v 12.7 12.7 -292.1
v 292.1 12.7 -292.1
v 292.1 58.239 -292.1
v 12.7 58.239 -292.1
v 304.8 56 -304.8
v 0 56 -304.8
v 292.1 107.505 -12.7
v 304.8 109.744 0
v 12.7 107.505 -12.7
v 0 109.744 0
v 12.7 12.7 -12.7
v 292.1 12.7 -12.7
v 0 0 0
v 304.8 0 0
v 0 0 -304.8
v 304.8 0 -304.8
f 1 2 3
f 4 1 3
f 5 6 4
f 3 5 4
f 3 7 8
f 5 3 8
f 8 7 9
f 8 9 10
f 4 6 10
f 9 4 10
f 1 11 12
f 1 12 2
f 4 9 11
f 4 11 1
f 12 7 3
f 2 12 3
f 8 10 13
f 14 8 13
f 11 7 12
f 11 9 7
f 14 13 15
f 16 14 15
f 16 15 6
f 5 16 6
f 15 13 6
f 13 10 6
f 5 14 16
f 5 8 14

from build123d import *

# Parameters (mm, degrees)
BOSS_EXTRUDE1_DEPTH = 304.8
SHELL1_T            = -12.7


with BuildPart() as part:
    # Sketch1 → Boss-Extrude1 (new body)
    with BuildSketch(Plane(origin=(0, 0, 0), x_dir=(0, 0, -1), z_dir=(1, 0, 0))):
        Polygon((0, 0), (304.8, 0), (304.8, 56), (0, 109.74446372), align=None)
    extrude(amount=BOSS_EXTRUDE1_DEPTH)

    # Shell1
    shell1_openings = [part.faces().sort_by_distance(p)[0] for p in [
        (152.4, 82.87223186, -152.4),
    ]]
    offset(amount=SHELL1_T, openings=shell1_openings, kind=Kind.INTERSECTION)


solid = part.part
